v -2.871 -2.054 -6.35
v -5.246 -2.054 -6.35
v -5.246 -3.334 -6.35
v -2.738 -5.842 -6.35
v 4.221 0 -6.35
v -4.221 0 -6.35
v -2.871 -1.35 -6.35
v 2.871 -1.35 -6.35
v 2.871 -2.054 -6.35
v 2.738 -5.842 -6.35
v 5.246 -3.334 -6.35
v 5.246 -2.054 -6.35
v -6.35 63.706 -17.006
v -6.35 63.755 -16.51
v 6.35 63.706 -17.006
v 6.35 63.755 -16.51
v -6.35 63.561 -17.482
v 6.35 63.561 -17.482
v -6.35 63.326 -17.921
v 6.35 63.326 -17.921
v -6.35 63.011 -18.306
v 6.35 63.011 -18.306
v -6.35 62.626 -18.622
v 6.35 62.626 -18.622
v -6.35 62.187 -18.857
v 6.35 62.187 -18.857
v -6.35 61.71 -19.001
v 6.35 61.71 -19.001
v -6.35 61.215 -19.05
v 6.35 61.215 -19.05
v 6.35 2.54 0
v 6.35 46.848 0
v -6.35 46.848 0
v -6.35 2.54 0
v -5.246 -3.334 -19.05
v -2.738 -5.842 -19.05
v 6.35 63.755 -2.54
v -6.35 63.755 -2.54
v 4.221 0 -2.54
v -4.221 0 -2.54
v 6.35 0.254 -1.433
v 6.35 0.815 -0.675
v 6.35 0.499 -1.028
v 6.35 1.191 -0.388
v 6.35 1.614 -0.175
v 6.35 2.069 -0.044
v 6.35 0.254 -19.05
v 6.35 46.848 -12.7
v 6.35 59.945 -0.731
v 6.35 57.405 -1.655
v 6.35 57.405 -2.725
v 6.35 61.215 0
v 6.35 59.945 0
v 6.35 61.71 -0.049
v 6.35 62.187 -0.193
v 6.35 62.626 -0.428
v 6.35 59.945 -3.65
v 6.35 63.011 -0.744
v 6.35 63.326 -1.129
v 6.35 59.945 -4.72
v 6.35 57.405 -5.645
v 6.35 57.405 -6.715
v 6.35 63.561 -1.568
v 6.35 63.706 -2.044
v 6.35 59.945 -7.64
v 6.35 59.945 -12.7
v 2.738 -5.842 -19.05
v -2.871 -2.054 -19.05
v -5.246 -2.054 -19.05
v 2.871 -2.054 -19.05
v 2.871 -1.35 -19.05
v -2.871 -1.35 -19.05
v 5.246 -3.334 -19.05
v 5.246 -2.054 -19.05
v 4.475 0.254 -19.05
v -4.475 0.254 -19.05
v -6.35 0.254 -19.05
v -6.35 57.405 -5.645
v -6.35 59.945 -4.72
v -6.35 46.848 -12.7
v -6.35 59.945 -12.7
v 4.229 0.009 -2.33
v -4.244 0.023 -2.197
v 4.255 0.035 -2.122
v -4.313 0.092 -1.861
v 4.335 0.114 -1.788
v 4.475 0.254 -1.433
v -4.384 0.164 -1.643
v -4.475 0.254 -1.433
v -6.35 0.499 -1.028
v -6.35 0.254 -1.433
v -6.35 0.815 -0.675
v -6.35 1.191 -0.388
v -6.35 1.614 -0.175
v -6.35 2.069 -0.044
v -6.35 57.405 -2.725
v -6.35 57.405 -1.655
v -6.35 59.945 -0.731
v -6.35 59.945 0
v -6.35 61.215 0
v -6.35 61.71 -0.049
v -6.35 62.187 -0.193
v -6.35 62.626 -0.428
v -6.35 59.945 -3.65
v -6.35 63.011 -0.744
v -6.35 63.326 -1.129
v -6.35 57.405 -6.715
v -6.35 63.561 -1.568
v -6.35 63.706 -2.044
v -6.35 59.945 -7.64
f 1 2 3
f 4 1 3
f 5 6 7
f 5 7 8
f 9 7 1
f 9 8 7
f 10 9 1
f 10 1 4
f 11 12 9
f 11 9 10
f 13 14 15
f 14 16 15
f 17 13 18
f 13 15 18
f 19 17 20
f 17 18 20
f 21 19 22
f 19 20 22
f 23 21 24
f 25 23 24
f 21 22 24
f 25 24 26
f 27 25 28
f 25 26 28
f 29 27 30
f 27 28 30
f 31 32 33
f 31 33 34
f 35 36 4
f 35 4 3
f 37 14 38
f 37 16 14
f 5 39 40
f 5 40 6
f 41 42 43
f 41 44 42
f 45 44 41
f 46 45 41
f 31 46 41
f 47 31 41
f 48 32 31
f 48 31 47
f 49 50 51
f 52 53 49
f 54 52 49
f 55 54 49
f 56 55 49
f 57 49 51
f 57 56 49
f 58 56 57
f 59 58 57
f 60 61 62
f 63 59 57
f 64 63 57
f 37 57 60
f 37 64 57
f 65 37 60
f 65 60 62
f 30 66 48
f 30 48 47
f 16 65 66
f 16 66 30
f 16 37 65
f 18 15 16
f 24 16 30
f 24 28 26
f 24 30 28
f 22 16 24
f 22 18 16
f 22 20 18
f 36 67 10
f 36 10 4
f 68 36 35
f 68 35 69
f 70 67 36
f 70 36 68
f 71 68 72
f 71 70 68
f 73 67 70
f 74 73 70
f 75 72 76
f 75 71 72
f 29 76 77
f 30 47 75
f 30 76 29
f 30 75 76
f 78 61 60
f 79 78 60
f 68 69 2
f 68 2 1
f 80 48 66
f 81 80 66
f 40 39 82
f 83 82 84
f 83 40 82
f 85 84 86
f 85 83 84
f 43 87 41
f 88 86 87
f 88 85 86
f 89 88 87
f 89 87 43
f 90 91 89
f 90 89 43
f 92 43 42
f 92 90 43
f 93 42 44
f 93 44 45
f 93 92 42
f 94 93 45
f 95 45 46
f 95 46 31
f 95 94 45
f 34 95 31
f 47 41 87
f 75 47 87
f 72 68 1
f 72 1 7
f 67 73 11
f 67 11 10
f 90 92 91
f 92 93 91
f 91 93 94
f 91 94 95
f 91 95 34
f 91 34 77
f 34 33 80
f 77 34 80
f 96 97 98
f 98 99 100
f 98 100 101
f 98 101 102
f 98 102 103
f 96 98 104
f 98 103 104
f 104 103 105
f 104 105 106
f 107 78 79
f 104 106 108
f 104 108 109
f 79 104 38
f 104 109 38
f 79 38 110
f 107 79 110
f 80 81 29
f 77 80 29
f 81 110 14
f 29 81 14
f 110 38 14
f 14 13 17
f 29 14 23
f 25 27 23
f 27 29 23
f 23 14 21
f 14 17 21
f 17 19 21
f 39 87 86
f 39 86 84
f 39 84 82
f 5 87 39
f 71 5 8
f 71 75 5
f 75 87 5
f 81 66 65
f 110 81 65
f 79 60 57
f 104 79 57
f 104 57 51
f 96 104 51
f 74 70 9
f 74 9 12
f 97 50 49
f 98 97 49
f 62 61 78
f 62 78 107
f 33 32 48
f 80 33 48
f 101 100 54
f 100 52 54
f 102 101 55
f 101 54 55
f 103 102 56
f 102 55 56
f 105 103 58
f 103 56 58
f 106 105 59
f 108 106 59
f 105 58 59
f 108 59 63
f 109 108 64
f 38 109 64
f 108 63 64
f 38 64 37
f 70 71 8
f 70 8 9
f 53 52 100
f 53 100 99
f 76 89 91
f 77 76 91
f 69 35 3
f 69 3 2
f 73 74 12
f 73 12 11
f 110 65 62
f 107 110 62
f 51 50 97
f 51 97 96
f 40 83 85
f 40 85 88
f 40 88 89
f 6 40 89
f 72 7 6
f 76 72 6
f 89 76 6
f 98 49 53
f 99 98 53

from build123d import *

# Parameters (mm, degrees)
BOSS_EXTRUDE1_DEPTH = 6.35
CUT_EXTRUDE1_DEPTH  = 13.7
CUT_EXTRUDE2_DEPTH  = 20.05
FILLET1_R           = 2.54
CUT_EXTRUDE3_DEPTH  = 20.05
SKETCH6_W           = 12.7
SKETCH6_H           = 0.396875
CUT_EXTRUDE4_DEPTH  = 13.7


with BuildPart() as part:
    # Sketch1 → Boss-Extrude1 (new body, symmetric)
    with BuildSketch(Plane(origin=(0, 0, 0), x_dir=(0, 0, -1), z_dir=(1, 0, 0))):
        Polygon((6.35, 0), (6.35, -6.096), (19.05, -6.096), (19.05, 63.754508), (12.7, 63.754508), (0, 63.754508), (0, 57.404508), (12.7, 57.404508), (12.7, 47.244508), (0, 47.244508), (0, 0), align=None)
    extrude(amount=BOSS_EXTRUDE1_DEPTH, both=True)

    # Sketch2 → Cut-Extrude1 (cut, through all)
    with BuildSketch(Plane(origin=(6.35, 0, 0), x_dir=(0, 0, -1), z_dir=(1, 0, 0))):
        with BuildLine():
            Line((12.7, 57.404508), (6.715252, 57.404508))
            Line((6.715252, 57.404508), (6.665278777, 57.267207698))
            ThreePointArc((6.665278777, 57.267207698), (6.572077823, 57.14574585), (6.426064417, 57.099708))
            Line((6.426064417, 57.099708), (5.934007978, 57.099708))
            ThreePointArc((5.934007978, 57.099708), (5.787994572, 57.14574585), (5.694793618, 57.267207698))
            Line((5.694793618, 57.267207698), (5.644820395, 57.404508))
            Line((5.644820395, 57.404508), (2.72542, 57.404508))
            Line((2.72542, 57.404508), (2.675446777, 57.267207698))
            ThreePointArc((2.675446777, 57.267207698), (2.582245823, 57.14574585), (2.436232417, 57.099708))
            Line((2.436232417, 57.099708), (1.944175978, 57.099708))
            ThreePointArc((1.944175978, 57.099708), (1.798162572, 57.14574585), (1.704961618, 57.267207698))
            Line((1.704961618, 57.267207698), (1.654988395, 57.404508))
            Line((1.654988395, 57.404508), (0, 57.404508))
            Line((0, 57.404508), (0, 47.244508))
            Line((0, 47.244508), (12.7, 47.244508))
            Line((12.7, 47.244508), (12.7, 57.404508))
        make_face()
        Polygon((2.72542, 57.404508), (5.644820395, 57.404508), (4.720336, 59.944508), (3.649904395, 59.944508), align=None)
        Polygon((0, 57.404508), (1.654988395, 57.404508), (0.730504, 59.944508), (0, 59.944508), align=None)
        Polygon((8.710168, 59.944508), (7.639736395, 59.944508), (6.715252, 57.404508), (12.7, 57.404508), (12.7, 59.944508), align=None)
    extrude(amount=-CUT_EXTRUDE1_DEPTH, mode=Mode.SUBTRACT)

    # Sketch3 → Cut-Extrude2 (cut, through all)
    with BuildSketch(Plane(origin=(0, 0, -19.05), x_dir=(-1, 0, 0), z_dir=(0, 0, -1))):
        Polygon((-6.35, -6.096), (-2.839339828, -6.1), (-5.5, -3.439339828), (-5.5, -1.8), (-3.125, -1.8), (-3.125, -1.455), (-4.58, 0), (-9.5, 0), align=None)
        Polygon((2.839339828, -6.1), (6.35, -6.096), (15.42, 0), (4.58, 0), (3.125, -1.455), (3.125, -1.8), (5.5, -1.8), (5.5, -3.439339828), align=None)
    extrude(amount=-CUT_EXTRUDE2_DEPTH, mode=Mode.SUBTRACT)

    # Fillet1
    fillet1_edges = [part.edges().sort_by_distance(p)[0] for p in [
        (0, 63.754508, 0),
        (0, 63.754508, -19.05),
        (0, 0, 0),
    ]]
    fillet(fillet1_edges, radius=FILLET1_R)

    # Sketch5 → Cut-Extrude3 (cut, through all)
    with BuildSketch(Plane(origin=(0, 0, -19.05), x_dir=(-1, 0, 0), z_dir=(0, 0, -1))):
        Polygon((6.35, 0), (4.58, 0), (3.125, -1.455), (3.125, -1.8), (5.5, -1.8), (5.5, -3.439339828), (2.843339828, -6.096), (-2.843339828, -6.096), (-5.5, -3.439339828), (-5.5, -1.8), (-3.125, -1.8), (-3.125, -1.455), (-4.58, 0), (-6.35, 0), (-6.35, 0.254), (-4.474789755, 0.254), (-2.871, -1.349789755), (-2.871, -2.054), (-5.246, -2.054), (-5.246, -3.334129583), (-2.738129583, -5.842), (2.738129583, -5.842), (5.246, -3.334129583), (5.246, -2.054), (2.871, -2.054), (2.871, -1.349789755), (4.474789755, 0.254), (6.35, 0.254), align=None)
    extrude(amount=-CUT_EXTRUDE3_DEPTH, mode=Mode.SUBTRACT)

    # Sketch6 → Cut-Extrude4 (cut, through all)
    with BuildSketch(Plane(origin=(6.35, 0, 0), x_dir=(0, 0, -1), z_dir=(1, 0, 0))):
        with Locations((6.35, 47.0460705)):
            Rectangle(SKETCH6_W, SKETCH6_H)
    extrude(amount=-CUT_EXTRUDE4_DEPTH, mode=Mode.SUBTRACT)


solid = part.part
